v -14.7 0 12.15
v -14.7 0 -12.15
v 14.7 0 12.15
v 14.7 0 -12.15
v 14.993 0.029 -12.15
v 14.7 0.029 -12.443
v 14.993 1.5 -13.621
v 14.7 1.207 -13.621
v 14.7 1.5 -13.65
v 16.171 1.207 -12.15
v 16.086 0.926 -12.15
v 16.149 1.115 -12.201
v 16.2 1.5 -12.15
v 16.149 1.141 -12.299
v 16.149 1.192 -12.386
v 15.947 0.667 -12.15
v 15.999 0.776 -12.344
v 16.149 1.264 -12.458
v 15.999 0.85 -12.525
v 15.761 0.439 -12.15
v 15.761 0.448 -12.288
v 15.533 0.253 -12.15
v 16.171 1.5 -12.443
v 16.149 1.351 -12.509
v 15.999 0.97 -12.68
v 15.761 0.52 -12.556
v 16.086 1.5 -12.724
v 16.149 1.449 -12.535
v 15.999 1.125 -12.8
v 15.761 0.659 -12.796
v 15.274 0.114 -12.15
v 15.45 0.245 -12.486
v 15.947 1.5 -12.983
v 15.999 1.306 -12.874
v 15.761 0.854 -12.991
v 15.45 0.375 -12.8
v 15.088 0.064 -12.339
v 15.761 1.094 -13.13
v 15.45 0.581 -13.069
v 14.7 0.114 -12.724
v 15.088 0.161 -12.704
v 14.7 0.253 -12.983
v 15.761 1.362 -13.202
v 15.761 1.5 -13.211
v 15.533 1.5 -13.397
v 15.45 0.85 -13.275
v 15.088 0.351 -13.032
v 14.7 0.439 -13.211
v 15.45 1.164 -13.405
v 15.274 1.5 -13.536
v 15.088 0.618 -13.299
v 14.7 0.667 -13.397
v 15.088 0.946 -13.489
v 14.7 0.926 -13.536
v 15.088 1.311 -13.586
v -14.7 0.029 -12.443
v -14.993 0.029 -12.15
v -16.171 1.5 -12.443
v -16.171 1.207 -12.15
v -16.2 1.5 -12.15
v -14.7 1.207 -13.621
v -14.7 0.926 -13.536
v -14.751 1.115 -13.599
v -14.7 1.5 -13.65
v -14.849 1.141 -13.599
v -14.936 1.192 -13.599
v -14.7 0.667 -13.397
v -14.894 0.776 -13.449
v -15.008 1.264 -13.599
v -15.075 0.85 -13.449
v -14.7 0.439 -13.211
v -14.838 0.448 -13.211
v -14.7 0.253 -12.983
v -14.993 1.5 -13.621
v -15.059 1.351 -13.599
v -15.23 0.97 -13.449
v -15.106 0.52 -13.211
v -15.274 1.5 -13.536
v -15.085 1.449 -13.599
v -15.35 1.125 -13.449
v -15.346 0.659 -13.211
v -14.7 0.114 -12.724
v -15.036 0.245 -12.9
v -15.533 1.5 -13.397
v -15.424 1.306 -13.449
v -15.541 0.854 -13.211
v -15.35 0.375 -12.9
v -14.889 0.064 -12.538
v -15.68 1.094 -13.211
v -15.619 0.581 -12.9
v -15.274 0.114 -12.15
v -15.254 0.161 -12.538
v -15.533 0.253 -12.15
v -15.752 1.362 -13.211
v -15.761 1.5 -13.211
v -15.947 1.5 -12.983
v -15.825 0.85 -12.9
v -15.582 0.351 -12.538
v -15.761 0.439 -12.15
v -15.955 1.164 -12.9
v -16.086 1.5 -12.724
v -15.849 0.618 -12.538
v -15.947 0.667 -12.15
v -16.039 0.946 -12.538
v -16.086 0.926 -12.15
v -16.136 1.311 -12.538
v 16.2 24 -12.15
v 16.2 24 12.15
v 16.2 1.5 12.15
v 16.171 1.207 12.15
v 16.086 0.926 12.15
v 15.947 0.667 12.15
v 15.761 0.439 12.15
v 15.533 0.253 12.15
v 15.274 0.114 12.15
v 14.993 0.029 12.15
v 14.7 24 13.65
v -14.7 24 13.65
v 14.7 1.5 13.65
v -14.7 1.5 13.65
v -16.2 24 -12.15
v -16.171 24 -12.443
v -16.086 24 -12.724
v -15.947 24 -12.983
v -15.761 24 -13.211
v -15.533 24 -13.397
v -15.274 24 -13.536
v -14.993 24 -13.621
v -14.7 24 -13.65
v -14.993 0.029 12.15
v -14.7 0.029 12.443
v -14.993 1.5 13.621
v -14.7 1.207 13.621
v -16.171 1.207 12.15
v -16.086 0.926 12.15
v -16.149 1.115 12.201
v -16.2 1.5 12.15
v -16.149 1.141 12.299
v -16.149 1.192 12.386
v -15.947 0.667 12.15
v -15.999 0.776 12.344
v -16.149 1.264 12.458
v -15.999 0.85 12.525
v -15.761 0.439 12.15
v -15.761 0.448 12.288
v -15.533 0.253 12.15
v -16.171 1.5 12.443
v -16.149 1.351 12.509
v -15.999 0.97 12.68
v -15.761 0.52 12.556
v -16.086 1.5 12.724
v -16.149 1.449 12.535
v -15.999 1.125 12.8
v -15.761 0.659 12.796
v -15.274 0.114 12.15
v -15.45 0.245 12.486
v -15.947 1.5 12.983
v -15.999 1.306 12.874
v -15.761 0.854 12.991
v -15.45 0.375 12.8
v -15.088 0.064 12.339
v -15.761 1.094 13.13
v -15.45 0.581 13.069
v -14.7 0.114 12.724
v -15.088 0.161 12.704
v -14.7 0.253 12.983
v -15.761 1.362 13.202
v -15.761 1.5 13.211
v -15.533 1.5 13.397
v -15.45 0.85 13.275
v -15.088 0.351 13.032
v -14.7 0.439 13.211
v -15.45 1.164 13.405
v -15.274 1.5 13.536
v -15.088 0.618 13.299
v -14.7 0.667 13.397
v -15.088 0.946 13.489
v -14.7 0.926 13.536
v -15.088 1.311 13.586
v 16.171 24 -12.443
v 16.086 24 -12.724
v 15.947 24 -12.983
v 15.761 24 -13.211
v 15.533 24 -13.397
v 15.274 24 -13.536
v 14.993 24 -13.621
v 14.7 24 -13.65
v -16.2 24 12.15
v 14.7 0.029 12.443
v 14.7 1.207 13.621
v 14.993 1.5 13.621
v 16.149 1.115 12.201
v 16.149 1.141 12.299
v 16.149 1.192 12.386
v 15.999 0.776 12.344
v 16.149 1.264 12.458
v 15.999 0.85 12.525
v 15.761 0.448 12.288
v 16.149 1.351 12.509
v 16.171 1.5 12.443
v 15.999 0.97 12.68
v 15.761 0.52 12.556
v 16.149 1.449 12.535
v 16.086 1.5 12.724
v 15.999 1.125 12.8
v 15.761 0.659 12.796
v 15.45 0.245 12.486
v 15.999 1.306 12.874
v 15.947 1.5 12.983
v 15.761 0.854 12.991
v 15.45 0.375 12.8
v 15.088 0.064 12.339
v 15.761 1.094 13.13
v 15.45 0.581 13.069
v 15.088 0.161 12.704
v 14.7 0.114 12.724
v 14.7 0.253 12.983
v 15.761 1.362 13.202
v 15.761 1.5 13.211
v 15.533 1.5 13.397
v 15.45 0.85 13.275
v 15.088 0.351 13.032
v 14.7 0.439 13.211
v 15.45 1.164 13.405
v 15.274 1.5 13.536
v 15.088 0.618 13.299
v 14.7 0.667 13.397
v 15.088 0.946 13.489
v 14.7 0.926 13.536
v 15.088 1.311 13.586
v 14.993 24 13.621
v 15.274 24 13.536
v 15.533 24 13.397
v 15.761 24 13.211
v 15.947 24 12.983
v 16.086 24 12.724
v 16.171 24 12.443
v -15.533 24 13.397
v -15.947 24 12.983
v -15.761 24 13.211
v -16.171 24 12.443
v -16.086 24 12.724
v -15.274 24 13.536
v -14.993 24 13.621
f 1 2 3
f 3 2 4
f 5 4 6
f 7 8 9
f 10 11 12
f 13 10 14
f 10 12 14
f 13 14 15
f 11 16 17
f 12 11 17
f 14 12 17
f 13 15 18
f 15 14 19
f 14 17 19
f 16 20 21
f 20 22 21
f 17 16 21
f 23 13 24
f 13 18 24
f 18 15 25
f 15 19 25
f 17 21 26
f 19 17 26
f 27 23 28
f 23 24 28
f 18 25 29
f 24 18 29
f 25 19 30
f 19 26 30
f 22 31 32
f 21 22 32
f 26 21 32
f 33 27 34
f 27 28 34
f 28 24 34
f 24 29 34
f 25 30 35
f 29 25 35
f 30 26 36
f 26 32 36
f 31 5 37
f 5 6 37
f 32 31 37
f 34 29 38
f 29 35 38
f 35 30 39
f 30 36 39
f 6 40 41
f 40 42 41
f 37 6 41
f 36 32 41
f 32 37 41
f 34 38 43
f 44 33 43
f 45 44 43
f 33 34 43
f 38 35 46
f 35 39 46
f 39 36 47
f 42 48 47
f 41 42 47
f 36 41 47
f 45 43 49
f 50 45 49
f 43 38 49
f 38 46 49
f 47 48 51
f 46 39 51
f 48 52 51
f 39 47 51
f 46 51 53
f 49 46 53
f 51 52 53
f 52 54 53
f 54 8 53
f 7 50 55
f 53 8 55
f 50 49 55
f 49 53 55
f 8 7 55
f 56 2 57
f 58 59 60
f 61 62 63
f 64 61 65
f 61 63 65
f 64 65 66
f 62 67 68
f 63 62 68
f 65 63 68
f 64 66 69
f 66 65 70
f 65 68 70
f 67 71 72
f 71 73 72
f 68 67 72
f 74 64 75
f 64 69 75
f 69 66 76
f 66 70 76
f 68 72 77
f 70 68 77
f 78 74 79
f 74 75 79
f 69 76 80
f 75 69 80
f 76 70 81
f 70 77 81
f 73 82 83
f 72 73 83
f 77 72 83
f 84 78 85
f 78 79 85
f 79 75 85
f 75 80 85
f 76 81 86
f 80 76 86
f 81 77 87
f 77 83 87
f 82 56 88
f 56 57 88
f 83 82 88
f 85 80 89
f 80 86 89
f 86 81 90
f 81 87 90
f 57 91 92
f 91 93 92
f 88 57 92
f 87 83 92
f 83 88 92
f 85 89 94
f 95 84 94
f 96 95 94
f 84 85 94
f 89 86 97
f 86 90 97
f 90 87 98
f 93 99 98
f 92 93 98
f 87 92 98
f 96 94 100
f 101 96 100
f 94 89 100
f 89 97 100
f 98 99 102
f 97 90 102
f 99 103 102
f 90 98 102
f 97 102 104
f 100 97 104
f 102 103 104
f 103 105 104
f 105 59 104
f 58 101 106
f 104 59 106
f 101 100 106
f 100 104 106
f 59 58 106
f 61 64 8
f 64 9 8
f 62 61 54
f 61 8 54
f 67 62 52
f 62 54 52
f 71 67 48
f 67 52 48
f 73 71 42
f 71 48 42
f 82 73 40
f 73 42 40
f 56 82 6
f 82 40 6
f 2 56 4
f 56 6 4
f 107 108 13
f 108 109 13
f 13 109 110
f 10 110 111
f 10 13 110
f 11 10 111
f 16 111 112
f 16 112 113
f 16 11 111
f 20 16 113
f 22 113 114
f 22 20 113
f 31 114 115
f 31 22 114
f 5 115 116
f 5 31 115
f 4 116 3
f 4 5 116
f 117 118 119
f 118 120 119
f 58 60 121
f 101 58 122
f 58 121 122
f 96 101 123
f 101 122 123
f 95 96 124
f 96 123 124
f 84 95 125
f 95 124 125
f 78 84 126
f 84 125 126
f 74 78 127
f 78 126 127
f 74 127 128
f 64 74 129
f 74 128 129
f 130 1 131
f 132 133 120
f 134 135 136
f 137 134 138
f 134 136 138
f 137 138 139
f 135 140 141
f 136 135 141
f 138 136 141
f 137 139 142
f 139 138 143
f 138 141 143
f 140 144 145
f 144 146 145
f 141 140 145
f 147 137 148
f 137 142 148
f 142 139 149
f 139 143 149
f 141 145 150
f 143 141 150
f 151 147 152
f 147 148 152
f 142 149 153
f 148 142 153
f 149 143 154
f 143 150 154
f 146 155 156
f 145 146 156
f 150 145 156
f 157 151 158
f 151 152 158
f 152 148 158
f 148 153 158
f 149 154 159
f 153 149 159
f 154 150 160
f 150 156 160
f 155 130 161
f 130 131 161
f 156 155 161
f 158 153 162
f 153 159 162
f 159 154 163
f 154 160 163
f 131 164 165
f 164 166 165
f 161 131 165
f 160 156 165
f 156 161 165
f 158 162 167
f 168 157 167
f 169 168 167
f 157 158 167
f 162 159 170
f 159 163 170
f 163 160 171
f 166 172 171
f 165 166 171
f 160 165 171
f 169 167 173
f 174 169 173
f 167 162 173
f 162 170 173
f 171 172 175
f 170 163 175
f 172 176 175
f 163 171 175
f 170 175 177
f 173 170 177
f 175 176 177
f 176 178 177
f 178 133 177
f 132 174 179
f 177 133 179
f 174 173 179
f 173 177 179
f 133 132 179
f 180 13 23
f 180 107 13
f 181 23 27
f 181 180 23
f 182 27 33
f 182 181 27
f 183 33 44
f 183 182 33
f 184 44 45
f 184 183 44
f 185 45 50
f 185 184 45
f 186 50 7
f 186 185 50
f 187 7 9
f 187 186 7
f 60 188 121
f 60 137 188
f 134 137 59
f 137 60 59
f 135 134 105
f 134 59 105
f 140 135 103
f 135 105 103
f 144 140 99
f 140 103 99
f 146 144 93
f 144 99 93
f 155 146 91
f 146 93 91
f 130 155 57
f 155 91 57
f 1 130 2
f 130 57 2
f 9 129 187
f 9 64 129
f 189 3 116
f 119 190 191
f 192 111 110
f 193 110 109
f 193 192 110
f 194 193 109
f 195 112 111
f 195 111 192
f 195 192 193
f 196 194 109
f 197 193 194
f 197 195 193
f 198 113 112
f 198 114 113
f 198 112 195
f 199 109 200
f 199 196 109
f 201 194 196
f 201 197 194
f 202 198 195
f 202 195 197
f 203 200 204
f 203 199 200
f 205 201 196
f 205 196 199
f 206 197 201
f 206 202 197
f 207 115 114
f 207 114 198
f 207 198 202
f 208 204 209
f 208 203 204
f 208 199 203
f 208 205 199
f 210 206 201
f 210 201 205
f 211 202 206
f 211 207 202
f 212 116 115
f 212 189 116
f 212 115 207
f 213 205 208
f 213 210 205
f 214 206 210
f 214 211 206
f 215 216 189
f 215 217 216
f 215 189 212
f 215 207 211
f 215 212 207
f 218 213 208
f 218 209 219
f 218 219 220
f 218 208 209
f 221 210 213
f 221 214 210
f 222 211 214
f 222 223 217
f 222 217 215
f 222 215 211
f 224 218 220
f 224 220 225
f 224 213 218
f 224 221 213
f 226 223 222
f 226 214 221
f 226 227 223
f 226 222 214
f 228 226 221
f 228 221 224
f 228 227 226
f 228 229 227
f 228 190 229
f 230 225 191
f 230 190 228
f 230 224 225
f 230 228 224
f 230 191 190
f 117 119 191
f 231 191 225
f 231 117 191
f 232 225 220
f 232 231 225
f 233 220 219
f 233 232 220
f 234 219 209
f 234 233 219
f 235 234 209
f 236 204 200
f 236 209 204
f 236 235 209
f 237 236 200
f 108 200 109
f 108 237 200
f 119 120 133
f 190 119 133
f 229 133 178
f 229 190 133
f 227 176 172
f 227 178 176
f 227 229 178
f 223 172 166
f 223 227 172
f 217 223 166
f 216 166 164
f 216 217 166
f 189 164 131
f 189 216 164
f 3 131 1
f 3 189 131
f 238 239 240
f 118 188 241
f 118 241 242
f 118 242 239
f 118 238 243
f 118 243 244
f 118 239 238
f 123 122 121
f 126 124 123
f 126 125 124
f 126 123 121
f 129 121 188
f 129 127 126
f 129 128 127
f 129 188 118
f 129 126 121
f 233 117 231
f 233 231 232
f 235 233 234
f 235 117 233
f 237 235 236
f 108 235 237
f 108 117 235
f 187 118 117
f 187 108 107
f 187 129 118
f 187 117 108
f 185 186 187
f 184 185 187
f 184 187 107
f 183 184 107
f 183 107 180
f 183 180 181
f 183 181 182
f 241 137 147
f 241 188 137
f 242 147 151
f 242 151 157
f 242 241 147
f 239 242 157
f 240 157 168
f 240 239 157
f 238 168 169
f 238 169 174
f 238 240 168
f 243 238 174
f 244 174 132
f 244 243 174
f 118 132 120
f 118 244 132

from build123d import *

# Parameters (mm, degrees)
SKIZZE1_W                       = 32.4
SKIZZE1_H                       = 27.3
AUFSATZ_LINEAR_AUSTRAGEN1_DEPTH = 24
VERRUNDUNG1_R                   = 1.5


with BuildPart() as part:
    # Skizze1 → Aufsatz-Linear austragen1 (new body)
    with BuildSketch(Plane(origin=(0, 0, 0), x_dir=(1, 0, 0), z_dir=(0, 1, 0))):
        Rectangle(SKIZZE1_W, SKIZZE1_H)
    extrude(amount=AUFSATZ_LINEAR_AUSTRAGEN1_DEPTH)

    # Verrundung1
    verrundung1_edges = [part.edges().sort_by_distance(p)[0] for p in [
        (0, 0, 13.65),
        (-16.2, 0, 0),
        (0, 0, -13.65),
        (16.2, 0, 0),
        (16.2, 12, 13.65),
        (-16.2, 12, 13.65),
        (-16.2, 12, -13.65),
        (16.2, 12, -13.65),
    ]]
    fillet(verrundung1_edges, radius=VERRUNDUNG1_R)


solid = part.part
